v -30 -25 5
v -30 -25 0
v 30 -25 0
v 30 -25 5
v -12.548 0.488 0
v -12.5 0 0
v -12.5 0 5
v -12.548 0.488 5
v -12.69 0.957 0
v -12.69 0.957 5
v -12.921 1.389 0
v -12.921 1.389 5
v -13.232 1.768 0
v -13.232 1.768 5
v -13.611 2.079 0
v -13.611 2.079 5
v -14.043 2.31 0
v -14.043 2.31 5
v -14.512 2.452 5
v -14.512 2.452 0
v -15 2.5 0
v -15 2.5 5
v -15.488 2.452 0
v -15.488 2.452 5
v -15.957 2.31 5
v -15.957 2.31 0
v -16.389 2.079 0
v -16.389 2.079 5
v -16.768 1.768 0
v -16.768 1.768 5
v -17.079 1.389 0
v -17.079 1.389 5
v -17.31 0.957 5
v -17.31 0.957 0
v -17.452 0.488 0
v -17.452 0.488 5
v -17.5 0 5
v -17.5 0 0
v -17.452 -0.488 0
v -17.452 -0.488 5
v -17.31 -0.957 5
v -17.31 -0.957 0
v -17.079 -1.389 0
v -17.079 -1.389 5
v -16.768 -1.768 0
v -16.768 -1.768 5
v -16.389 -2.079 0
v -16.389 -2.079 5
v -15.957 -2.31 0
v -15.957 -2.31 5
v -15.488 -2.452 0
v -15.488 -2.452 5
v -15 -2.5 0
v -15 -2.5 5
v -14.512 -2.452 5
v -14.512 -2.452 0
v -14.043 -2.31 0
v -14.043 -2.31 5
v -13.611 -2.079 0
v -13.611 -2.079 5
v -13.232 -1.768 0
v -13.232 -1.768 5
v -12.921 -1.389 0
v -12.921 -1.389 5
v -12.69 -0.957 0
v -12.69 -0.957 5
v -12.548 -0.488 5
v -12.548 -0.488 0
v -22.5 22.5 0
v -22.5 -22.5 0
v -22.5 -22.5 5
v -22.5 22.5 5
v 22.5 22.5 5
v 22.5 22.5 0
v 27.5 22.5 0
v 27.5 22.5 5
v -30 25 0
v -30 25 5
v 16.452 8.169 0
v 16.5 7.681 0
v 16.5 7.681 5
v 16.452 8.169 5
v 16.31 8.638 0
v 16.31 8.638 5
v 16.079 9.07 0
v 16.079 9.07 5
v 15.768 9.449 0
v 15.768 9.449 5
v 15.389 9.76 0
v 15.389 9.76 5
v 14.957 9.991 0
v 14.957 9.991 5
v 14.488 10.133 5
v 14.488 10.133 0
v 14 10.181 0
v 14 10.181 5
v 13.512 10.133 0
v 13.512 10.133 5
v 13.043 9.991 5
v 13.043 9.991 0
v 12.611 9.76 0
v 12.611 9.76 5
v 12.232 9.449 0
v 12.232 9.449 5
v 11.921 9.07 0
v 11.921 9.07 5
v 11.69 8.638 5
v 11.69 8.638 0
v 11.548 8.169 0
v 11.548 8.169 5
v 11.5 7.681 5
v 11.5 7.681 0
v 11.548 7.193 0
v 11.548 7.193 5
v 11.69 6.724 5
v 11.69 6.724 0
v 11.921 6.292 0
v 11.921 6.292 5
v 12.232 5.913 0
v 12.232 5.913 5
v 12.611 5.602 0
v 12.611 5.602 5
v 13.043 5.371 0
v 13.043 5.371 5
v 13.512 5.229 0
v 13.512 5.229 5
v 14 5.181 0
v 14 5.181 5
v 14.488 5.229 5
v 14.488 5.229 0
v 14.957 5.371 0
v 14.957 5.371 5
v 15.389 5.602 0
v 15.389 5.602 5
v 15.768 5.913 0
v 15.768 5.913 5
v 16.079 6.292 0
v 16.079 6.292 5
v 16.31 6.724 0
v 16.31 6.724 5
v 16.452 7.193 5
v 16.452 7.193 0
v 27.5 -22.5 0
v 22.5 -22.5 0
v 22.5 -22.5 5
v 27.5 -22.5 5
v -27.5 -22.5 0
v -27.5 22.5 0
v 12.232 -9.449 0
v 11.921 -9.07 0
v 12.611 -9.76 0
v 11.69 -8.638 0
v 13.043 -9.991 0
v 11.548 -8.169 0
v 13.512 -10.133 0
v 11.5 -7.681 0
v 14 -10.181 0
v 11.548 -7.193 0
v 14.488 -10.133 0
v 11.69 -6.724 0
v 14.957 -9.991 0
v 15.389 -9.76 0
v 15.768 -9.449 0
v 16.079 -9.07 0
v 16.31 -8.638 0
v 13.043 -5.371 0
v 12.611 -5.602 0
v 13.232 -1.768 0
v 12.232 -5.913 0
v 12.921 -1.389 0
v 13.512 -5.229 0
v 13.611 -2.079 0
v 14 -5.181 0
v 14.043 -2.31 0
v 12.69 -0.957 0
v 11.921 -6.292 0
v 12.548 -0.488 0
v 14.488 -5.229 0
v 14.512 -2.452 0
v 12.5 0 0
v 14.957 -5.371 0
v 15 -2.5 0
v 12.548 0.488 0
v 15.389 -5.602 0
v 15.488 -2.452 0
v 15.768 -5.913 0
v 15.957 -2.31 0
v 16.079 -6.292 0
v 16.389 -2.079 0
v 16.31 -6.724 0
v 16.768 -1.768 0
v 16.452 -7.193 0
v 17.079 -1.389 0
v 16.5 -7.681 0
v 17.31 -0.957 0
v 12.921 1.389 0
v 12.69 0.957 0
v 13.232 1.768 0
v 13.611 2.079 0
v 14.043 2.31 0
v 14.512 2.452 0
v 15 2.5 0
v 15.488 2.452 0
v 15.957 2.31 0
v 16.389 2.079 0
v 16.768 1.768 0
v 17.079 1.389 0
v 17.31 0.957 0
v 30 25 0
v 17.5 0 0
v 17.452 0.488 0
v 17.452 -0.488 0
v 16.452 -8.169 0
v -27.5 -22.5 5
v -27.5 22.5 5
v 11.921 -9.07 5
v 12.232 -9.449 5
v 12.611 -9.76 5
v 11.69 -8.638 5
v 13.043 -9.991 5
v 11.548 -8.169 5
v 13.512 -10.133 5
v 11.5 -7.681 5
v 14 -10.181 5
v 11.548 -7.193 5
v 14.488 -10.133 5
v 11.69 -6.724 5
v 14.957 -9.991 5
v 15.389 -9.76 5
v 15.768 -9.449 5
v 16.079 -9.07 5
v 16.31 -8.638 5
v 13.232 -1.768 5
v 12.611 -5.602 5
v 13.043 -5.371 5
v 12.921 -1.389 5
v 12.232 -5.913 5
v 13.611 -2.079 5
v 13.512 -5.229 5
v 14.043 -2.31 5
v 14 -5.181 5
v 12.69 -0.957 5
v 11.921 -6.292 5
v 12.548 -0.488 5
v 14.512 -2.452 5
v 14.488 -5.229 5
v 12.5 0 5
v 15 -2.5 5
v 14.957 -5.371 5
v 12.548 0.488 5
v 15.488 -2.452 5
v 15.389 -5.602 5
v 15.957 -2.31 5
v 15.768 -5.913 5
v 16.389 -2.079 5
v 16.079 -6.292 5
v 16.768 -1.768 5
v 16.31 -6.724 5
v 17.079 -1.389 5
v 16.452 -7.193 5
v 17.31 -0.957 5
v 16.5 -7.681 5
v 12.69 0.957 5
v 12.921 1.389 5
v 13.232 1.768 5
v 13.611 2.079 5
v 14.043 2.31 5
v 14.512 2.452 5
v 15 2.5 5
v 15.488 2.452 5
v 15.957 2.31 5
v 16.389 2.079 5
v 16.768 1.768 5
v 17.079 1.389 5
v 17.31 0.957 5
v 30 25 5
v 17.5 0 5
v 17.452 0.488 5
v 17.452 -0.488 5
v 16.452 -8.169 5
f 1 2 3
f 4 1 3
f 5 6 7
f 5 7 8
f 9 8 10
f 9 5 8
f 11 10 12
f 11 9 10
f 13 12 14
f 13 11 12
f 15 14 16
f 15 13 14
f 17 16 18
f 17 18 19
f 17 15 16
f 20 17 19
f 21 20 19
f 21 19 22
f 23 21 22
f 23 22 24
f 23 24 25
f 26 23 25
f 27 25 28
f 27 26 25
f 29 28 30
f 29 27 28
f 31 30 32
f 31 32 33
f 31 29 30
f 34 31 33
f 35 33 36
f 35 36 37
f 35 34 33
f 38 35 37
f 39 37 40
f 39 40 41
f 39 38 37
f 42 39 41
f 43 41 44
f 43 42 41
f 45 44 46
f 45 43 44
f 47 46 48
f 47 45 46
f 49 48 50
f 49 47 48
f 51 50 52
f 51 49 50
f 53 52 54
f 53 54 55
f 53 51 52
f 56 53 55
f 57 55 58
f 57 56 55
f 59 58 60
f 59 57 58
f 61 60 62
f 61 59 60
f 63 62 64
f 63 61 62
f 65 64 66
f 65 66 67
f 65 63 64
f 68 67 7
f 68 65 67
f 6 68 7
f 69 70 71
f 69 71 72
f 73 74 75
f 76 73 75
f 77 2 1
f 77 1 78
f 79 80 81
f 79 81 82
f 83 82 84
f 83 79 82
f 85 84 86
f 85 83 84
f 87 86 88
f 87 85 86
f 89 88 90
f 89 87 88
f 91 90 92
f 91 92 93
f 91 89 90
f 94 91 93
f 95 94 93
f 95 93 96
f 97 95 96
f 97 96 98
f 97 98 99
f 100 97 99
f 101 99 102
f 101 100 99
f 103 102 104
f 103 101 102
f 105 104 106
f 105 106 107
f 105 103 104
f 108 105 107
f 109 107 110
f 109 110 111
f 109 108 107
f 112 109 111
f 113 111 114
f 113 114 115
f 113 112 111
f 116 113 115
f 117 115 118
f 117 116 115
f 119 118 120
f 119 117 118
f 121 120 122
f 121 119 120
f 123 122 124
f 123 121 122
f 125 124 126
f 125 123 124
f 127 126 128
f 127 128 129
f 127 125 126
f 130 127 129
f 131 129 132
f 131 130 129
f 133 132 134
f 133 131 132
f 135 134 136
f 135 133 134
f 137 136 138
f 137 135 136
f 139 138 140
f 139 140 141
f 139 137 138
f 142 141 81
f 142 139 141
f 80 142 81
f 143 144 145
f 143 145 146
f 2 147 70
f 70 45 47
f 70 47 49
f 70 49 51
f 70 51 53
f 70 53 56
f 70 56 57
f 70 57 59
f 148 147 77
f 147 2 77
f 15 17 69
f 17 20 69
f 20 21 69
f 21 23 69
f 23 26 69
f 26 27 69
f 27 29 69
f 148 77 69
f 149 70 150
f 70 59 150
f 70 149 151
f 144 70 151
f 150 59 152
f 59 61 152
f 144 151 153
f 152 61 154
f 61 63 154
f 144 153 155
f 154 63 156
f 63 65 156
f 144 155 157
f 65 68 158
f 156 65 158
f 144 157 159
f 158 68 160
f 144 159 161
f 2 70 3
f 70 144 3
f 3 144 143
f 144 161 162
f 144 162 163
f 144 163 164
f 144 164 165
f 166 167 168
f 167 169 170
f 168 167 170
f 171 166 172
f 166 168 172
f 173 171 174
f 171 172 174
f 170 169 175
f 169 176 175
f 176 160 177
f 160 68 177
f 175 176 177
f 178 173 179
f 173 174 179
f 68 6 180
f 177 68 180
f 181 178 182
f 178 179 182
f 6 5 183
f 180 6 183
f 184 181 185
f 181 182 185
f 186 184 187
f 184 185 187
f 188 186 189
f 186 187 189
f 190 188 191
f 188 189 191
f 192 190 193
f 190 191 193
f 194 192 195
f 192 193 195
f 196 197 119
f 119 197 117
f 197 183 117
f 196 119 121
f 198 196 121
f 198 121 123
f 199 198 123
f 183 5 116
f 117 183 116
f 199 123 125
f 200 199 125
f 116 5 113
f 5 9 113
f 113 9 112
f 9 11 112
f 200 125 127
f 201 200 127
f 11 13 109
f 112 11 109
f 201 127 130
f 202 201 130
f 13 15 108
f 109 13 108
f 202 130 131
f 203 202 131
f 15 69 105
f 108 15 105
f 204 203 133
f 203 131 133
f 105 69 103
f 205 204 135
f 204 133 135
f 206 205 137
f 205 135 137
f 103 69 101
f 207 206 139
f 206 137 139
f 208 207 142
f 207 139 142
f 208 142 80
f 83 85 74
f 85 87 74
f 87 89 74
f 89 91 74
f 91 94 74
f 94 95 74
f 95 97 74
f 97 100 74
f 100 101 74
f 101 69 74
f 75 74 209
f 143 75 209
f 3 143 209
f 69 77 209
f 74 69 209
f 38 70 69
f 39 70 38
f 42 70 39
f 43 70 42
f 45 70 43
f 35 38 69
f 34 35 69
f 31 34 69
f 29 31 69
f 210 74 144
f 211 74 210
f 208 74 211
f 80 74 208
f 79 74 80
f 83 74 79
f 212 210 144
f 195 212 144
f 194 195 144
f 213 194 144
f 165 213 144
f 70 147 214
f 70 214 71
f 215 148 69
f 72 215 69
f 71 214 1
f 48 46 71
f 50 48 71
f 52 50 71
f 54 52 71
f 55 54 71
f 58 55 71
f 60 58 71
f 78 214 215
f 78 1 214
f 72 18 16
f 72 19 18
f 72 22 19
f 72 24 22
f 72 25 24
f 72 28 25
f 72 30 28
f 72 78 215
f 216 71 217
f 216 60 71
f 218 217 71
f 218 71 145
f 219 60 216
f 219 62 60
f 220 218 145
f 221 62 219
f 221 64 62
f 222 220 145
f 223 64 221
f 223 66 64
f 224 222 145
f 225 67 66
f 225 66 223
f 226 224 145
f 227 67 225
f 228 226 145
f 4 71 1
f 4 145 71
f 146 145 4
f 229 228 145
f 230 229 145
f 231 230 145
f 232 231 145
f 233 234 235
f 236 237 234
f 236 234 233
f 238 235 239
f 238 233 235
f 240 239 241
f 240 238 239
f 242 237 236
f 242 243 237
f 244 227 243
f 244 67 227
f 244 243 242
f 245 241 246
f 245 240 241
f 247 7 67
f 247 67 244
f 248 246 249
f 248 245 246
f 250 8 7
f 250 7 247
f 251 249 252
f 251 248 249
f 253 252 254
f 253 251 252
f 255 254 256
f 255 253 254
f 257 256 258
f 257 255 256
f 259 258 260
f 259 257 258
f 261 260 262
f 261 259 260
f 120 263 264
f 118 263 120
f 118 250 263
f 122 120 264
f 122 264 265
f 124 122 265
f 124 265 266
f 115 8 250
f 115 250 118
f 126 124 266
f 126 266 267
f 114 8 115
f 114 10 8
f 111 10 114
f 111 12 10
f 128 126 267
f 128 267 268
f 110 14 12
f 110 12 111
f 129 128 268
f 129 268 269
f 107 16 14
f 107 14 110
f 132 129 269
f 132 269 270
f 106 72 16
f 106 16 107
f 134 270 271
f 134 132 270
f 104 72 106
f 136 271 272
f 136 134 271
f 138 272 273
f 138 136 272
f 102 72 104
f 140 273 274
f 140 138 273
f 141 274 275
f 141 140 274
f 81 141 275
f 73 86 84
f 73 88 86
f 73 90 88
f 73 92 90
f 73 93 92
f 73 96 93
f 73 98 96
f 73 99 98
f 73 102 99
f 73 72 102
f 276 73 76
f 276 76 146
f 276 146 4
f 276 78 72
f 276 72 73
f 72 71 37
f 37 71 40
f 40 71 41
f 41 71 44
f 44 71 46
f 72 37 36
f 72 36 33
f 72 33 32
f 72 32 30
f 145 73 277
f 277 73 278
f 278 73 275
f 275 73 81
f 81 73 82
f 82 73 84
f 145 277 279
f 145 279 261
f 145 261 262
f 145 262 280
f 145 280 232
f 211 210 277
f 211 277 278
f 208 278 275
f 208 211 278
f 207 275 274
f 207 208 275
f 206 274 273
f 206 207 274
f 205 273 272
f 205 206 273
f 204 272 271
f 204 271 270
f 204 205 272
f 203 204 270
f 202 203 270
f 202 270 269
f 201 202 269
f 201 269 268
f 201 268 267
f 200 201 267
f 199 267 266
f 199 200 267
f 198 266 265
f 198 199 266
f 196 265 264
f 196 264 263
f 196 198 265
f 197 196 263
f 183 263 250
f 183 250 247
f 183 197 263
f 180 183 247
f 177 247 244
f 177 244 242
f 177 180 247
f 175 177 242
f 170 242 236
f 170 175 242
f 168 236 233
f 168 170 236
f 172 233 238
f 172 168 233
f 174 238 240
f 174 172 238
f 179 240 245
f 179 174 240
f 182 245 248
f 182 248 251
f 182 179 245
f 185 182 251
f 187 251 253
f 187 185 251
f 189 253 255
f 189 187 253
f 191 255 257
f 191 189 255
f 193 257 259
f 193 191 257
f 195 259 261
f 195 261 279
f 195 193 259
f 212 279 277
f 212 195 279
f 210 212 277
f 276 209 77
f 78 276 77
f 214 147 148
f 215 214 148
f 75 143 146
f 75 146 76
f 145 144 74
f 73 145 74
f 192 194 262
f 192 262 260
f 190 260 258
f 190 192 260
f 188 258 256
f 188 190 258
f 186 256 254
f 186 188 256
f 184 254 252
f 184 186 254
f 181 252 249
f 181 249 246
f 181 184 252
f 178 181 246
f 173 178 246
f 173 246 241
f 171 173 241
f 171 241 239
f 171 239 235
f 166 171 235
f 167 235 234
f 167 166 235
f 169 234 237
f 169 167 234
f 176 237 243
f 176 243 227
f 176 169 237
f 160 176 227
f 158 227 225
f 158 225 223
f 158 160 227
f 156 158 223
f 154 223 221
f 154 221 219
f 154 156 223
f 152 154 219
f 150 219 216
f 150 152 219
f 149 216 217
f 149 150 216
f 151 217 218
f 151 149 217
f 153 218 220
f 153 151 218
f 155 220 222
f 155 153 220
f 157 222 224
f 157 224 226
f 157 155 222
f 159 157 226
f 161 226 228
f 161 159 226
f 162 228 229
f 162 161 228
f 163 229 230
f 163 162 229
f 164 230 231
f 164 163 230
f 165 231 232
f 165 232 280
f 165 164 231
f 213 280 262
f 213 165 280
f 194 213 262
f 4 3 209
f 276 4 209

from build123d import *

# Parameters (mm, degrees)
F0_W     = 40
F0_H     = 50
F0_R     = 2.5
F0_W_2   = 10
F0_W_3   = 5
F0_H_2   = 45
F1_DEPTH = 5


with BuildPart() as f1:
    # F0 (on Top) → F1 (new body)
    with BuildSketch(Plane.XY):
        Rectangle(F0_W, F0_H)
        with Locations((14, -7.681146)):
            Circle(F0_R, mode=Mode.SUBTRACT)
        with Locations((-15, 0)):
            Circle(F0_R, mode=Mode.SUBTRACT)
        with Locations((14, 7.681146)):
            Circle(F0_R, mode=Mode.SUBTRACT)
        with Locations((15, 0)):
            Circle(F0_R, mode=Mode.SUBTRACT)
        with Locations((-25, 0)):
            Rectangle(F0_W_2, F0_H)
        with Locations((-25, 0)):
            Rectangle(F0_W_3, F0_H_2, mode=Mode.SUBTRACT)
        with Locations((25, 0)):
            Rectangle(F0_W_2, F0_H)
        with Locations((25, 0)):
            Rectangle(F0_W_3, F0_H_2, mode=Mode.SUBTRACT)
    extrude(amount=F1_DEPTH)


solid = f1.part
